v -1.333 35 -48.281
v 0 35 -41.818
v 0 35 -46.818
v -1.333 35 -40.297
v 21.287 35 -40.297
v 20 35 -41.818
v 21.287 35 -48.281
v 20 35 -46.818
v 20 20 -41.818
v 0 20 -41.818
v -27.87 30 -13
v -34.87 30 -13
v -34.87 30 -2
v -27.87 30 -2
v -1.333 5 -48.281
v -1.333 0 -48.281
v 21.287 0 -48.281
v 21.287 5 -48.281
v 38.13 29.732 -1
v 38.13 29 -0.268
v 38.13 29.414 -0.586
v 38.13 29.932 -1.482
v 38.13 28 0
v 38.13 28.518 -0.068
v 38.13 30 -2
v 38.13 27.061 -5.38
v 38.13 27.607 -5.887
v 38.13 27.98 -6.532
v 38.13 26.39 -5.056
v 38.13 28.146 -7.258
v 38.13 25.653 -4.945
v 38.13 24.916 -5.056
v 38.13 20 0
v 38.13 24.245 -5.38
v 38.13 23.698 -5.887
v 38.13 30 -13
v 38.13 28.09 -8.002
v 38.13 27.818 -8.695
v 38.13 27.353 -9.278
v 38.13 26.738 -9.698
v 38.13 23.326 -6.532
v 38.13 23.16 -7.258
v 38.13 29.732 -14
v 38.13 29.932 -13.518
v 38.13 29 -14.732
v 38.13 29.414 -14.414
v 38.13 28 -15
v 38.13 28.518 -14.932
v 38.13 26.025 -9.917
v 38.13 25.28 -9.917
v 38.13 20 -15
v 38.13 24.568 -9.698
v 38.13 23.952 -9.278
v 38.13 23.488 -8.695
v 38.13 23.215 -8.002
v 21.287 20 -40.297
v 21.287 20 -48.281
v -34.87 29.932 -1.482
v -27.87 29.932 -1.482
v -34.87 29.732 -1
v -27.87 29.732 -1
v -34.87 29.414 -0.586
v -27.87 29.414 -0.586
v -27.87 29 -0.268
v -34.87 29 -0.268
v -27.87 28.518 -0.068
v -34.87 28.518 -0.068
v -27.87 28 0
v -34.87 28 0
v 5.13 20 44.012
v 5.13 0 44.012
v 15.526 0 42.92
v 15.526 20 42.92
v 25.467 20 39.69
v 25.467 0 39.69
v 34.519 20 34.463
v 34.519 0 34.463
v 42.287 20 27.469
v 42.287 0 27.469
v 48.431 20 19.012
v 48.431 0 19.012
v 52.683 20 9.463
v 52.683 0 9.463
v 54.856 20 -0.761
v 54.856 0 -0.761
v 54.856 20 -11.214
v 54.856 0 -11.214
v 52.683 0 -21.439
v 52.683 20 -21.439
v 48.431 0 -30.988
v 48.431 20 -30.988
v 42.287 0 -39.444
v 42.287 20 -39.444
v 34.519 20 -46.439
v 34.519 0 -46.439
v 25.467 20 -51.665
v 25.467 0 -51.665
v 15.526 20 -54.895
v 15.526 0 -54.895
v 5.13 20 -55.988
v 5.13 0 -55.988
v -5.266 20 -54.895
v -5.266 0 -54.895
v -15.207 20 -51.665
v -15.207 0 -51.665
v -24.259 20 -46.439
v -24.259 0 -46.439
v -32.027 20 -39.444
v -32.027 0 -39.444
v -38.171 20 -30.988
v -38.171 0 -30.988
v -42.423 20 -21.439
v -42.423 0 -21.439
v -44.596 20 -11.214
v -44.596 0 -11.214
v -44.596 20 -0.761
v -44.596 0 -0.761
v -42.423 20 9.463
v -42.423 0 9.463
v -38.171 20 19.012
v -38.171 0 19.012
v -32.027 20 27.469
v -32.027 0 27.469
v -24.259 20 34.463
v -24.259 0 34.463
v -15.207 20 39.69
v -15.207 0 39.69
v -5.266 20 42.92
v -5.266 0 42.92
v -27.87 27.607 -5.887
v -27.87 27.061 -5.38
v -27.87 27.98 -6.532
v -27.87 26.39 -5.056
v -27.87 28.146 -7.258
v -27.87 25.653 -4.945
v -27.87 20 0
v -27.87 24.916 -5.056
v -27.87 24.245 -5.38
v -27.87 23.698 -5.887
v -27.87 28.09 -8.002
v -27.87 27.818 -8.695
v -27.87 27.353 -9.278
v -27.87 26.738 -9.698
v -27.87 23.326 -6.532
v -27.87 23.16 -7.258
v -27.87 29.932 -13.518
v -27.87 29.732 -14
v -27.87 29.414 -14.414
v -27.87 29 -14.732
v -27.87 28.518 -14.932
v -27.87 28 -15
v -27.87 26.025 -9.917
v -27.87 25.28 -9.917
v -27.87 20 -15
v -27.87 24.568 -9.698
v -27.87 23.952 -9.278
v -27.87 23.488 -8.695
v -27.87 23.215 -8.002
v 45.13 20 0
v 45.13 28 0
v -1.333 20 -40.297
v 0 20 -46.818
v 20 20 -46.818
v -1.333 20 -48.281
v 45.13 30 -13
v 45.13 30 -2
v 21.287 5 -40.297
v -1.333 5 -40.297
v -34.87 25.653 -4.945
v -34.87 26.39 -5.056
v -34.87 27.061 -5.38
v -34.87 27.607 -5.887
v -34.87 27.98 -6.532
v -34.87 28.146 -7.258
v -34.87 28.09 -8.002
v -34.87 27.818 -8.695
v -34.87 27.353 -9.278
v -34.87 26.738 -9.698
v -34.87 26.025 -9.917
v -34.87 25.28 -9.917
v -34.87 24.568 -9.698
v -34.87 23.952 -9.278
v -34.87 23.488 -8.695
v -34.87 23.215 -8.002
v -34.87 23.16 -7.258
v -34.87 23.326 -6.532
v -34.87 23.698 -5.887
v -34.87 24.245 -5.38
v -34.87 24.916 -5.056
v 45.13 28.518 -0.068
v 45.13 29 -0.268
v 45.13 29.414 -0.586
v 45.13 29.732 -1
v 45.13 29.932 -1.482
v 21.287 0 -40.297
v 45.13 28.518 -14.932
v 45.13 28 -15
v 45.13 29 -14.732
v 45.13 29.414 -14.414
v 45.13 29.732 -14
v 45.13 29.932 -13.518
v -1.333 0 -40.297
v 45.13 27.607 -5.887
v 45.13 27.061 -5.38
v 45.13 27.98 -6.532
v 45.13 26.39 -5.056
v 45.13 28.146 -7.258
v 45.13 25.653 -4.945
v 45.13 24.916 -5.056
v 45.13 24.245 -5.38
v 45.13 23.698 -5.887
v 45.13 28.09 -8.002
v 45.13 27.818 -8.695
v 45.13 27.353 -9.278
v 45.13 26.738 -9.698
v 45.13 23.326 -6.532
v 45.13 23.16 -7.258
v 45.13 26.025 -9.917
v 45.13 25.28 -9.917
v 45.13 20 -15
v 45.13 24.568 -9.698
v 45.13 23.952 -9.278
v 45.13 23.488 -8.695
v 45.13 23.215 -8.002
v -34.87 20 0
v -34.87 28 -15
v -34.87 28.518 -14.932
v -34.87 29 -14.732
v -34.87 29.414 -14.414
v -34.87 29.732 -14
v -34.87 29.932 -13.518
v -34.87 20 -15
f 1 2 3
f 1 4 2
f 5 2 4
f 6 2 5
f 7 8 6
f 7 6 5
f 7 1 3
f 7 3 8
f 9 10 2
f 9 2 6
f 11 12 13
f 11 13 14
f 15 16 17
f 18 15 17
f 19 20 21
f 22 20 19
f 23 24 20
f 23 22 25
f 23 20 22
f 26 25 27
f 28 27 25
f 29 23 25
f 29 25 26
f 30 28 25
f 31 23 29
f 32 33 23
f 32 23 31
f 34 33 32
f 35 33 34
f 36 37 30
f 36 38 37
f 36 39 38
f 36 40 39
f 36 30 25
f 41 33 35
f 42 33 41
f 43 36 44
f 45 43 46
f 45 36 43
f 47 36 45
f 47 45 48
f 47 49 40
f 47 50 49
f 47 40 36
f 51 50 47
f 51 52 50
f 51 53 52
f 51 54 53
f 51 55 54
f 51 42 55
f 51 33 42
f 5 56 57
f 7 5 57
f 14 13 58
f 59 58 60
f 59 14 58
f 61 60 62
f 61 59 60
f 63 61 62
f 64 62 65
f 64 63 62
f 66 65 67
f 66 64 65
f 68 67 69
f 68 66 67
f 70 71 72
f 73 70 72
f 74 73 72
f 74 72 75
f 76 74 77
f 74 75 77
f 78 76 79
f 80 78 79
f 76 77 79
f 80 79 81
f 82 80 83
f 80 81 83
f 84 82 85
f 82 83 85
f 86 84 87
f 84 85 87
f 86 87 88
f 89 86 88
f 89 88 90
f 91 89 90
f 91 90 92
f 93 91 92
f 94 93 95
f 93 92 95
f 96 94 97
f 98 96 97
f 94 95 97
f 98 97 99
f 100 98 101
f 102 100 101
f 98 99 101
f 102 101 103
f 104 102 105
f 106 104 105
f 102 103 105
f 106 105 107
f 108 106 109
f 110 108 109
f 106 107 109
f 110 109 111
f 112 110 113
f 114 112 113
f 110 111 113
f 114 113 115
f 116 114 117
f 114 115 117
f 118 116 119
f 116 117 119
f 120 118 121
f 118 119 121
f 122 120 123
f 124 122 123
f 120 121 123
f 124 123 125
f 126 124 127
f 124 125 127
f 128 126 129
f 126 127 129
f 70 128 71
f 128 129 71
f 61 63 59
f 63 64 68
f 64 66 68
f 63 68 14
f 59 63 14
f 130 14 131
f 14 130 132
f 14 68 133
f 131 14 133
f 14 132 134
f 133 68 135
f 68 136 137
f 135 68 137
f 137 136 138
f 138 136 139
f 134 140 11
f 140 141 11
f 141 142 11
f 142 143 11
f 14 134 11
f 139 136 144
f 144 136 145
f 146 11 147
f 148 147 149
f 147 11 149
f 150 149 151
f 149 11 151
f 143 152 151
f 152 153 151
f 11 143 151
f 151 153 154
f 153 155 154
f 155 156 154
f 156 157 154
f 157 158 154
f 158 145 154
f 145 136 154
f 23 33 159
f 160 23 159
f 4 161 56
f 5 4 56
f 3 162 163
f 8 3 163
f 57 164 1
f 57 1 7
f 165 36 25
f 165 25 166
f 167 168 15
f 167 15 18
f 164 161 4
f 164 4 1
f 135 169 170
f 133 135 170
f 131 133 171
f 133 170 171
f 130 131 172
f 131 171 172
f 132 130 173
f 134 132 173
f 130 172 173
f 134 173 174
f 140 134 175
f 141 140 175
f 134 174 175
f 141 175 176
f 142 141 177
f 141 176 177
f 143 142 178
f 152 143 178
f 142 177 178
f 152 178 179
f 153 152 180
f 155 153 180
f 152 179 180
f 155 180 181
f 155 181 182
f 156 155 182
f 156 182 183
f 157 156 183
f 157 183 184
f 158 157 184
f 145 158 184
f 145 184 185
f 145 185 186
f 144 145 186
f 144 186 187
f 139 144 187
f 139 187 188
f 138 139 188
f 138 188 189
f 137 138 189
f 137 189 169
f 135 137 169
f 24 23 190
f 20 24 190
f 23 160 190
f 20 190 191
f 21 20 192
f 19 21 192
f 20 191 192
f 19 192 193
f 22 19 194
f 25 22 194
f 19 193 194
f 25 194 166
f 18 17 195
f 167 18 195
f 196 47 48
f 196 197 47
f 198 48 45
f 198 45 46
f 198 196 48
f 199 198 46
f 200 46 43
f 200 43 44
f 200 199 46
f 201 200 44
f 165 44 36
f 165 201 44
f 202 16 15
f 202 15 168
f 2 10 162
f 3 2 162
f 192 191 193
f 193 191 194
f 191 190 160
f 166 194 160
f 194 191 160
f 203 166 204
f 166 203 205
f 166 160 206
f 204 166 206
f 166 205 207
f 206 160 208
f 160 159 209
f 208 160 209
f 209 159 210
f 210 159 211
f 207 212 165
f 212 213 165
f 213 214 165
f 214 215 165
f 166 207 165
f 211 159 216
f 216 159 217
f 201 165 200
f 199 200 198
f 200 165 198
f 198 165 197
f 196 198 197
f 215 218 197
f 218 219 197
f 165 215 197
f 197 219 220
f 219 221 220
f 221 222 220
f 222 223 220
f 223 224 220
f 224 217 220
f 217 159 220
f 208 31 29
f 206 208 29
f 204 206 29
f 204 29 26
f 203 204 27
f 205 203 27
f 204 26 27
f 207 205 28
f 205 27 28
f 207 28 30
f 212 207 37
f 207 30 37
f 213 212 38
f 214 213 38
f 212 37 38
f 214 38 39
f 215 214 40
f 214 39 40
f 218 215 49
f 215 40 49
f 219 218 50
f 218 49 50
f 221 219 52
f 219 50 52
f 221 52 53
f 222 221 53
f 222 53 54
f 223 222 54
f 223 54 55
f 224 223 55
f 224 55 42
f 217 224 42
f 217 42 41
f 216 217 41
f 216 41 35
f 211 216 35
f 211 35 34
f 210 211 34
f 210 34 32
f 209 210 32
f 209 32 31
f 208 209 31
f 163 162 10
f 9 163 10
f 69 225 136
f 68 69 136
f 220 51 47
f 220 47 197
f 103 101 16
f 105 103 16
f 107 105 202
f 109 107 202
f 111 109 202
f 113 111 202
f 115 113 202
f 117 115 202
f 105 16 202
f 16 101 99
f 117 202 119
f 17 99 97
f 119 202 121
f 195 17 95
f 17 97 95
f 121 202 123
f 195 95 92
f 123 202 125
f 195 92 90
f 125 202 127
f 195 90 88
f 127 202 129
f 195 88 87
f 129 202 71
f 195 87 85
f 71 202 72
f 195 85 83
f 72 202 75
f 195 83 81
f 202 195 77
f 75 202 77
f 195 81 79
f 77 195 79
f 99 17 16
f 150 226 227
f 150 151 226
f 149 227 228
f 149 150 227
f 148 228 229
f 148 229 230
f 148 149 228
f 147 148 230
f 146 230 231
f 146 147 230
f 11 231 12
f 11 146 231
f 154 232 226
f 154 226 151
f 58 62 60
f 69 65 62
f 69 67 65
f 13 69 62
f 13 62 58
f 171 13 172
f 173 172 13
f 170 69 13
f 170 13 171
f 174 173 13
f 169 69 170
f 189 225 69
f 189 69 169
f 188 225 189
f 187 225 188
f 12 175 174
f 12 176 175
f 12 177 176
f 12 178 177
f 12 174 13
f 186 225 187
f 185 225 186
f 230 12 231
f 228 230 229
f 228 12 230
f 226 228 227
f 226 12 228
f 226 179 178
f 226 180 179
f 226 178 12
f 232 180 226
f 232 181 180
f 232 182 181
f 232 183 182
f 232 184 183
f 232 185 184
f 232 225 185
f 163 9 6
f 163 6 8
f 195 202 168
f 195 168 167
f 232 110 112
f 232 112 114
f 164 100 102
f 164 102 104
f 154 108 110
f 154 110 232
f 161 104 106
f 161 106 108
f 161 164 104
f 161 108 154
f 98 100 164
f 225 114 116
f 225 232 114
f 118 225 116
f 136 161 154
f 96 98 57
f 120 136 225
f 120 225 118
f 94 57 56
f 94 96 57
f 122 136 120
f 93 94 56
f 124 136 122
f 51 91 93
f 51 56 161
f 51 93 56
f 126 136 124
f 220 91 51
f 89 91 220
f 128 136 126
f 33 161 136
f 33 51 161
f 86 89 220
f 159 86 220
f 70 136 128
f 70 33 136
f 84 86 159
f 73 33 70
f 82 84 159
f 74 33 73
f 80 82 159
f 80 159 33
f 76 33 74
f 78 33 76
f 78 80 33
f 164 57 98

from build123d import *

# Parameters (mm, degrees)
SKETCH_2_R          = 50
EXTRUDE_1_DEPTH     = 20
SKETCH_3_W          = 7
SKETCH_3_H          = 15
EXTRUDE_2_DEPTH     = 10
SKETCH_5_R          = 2.5
CUT_EXTRUDE_1_DEPTH = 111.157271919
SKETCH_7_W          = 22.619643184
SKETCH_7_H          = 7.983403476
SKETCH_7_W_2        = 20
SKETCH_7_H_2        = 5
EXTRUDE_3_DEPTH     = 15
SKETCH_8_W          = 22.619643184
SKETCH_8_H          = 7.983403476
CUT_EXTRUDE_2_DEPTH = 5
FILLET_1_R          = 2
FILLET_2_R          = 2


with BuildPart() as part:
    # 草图2 → 凸台-拉伸1 (new body)
    with BuildSketch(Plane(origin=(0, 0, 0), x_dir=(1, 0, 0), z_dir=(0, 1, 0))):
        with Locations(Location((5.130022326, 5.987717908, 0), (0, 0, 270))):
            Circle(SKETCH_2_R)
    extrude(amount=EXTRUDE_1_DEPTH)

    # 草图3 → 凸台-拉伸2 (add)
    with BuildSketch(Plane(origin=(0, 20, 0), x_dir=(1, 0, 0), z_dir=(0, 1, 0))):
        with Locations((-31.369977674, 7.5)):
            Rectangle(SKETCH_3_W, SKETCH_3_H)
        with Locations((41.630022326, 7.5)):
            Rectangle(SKETCH_3_W, SKETCH_3_H)
    extrude(amount=EXTRUDE_2_DEPTH)

    # 草图5 → 切除-拉伸1 (cut, through all)
    with BuildSketch(Plane.ZY.offset(34.869977674)):
        with Locations((-7.44529761, 25.652801918)):
            Circle(SKETCH_5_R)
    extrude(amount=-CUT_EXTRUDE_1_DEPTH, mode=Mode.SUBTRACT)

    # 草图7 → 凸台-拉伸3 (add)
    with BuildSketch(Plane(origin=(0, 20, 0), x_dir=(1, 0, 0), z_dir=(0, 1, 0))):
        with Locations((9.977088722, 44.289046493)):
            Rectangle(SKETCH_7_W, SKETCH_7_H)
        with Locations((10, 44.317993036)):
            Rectangle(SKETCH_7_W_2, SKETCH_7_H_2, mode=Mode.SUBTRACT)
    extrude(amount=EXTRUDE_3_DEPTH)

    # 草图8 → 切除-拉伸2 (cut)
    with BuildSketch(Plane.XZ):
        with Locations((9.977088722, -44.289046493)):
            Rectangle(SKETCH_8_W, SKETCH_8_H)
    extrude(amount=-CUT_EXTRUDE_2_DEPTH, mode=Mode.SUBTRACT)

    # 圆角1
    fillet_1_edges = [part.edges().sort_by_distance(p)[0] for p in [
        (-31.369977674, 30, -15),
    ]]
    fillet(fillet_1_edges, radius=FILLET_1_R)

    # 圆角2
    fillet_2_edges = [part.edges().sort_by_distance(p)[0] for p in [
        (41.630022326, 30, 0),
        (41.630022326, 30, -15),
        (-31.369977674, 30, 0),
    ]]
    fillet(fillet_2_edges, radius=FILLET_2_R)


solid = part.part
